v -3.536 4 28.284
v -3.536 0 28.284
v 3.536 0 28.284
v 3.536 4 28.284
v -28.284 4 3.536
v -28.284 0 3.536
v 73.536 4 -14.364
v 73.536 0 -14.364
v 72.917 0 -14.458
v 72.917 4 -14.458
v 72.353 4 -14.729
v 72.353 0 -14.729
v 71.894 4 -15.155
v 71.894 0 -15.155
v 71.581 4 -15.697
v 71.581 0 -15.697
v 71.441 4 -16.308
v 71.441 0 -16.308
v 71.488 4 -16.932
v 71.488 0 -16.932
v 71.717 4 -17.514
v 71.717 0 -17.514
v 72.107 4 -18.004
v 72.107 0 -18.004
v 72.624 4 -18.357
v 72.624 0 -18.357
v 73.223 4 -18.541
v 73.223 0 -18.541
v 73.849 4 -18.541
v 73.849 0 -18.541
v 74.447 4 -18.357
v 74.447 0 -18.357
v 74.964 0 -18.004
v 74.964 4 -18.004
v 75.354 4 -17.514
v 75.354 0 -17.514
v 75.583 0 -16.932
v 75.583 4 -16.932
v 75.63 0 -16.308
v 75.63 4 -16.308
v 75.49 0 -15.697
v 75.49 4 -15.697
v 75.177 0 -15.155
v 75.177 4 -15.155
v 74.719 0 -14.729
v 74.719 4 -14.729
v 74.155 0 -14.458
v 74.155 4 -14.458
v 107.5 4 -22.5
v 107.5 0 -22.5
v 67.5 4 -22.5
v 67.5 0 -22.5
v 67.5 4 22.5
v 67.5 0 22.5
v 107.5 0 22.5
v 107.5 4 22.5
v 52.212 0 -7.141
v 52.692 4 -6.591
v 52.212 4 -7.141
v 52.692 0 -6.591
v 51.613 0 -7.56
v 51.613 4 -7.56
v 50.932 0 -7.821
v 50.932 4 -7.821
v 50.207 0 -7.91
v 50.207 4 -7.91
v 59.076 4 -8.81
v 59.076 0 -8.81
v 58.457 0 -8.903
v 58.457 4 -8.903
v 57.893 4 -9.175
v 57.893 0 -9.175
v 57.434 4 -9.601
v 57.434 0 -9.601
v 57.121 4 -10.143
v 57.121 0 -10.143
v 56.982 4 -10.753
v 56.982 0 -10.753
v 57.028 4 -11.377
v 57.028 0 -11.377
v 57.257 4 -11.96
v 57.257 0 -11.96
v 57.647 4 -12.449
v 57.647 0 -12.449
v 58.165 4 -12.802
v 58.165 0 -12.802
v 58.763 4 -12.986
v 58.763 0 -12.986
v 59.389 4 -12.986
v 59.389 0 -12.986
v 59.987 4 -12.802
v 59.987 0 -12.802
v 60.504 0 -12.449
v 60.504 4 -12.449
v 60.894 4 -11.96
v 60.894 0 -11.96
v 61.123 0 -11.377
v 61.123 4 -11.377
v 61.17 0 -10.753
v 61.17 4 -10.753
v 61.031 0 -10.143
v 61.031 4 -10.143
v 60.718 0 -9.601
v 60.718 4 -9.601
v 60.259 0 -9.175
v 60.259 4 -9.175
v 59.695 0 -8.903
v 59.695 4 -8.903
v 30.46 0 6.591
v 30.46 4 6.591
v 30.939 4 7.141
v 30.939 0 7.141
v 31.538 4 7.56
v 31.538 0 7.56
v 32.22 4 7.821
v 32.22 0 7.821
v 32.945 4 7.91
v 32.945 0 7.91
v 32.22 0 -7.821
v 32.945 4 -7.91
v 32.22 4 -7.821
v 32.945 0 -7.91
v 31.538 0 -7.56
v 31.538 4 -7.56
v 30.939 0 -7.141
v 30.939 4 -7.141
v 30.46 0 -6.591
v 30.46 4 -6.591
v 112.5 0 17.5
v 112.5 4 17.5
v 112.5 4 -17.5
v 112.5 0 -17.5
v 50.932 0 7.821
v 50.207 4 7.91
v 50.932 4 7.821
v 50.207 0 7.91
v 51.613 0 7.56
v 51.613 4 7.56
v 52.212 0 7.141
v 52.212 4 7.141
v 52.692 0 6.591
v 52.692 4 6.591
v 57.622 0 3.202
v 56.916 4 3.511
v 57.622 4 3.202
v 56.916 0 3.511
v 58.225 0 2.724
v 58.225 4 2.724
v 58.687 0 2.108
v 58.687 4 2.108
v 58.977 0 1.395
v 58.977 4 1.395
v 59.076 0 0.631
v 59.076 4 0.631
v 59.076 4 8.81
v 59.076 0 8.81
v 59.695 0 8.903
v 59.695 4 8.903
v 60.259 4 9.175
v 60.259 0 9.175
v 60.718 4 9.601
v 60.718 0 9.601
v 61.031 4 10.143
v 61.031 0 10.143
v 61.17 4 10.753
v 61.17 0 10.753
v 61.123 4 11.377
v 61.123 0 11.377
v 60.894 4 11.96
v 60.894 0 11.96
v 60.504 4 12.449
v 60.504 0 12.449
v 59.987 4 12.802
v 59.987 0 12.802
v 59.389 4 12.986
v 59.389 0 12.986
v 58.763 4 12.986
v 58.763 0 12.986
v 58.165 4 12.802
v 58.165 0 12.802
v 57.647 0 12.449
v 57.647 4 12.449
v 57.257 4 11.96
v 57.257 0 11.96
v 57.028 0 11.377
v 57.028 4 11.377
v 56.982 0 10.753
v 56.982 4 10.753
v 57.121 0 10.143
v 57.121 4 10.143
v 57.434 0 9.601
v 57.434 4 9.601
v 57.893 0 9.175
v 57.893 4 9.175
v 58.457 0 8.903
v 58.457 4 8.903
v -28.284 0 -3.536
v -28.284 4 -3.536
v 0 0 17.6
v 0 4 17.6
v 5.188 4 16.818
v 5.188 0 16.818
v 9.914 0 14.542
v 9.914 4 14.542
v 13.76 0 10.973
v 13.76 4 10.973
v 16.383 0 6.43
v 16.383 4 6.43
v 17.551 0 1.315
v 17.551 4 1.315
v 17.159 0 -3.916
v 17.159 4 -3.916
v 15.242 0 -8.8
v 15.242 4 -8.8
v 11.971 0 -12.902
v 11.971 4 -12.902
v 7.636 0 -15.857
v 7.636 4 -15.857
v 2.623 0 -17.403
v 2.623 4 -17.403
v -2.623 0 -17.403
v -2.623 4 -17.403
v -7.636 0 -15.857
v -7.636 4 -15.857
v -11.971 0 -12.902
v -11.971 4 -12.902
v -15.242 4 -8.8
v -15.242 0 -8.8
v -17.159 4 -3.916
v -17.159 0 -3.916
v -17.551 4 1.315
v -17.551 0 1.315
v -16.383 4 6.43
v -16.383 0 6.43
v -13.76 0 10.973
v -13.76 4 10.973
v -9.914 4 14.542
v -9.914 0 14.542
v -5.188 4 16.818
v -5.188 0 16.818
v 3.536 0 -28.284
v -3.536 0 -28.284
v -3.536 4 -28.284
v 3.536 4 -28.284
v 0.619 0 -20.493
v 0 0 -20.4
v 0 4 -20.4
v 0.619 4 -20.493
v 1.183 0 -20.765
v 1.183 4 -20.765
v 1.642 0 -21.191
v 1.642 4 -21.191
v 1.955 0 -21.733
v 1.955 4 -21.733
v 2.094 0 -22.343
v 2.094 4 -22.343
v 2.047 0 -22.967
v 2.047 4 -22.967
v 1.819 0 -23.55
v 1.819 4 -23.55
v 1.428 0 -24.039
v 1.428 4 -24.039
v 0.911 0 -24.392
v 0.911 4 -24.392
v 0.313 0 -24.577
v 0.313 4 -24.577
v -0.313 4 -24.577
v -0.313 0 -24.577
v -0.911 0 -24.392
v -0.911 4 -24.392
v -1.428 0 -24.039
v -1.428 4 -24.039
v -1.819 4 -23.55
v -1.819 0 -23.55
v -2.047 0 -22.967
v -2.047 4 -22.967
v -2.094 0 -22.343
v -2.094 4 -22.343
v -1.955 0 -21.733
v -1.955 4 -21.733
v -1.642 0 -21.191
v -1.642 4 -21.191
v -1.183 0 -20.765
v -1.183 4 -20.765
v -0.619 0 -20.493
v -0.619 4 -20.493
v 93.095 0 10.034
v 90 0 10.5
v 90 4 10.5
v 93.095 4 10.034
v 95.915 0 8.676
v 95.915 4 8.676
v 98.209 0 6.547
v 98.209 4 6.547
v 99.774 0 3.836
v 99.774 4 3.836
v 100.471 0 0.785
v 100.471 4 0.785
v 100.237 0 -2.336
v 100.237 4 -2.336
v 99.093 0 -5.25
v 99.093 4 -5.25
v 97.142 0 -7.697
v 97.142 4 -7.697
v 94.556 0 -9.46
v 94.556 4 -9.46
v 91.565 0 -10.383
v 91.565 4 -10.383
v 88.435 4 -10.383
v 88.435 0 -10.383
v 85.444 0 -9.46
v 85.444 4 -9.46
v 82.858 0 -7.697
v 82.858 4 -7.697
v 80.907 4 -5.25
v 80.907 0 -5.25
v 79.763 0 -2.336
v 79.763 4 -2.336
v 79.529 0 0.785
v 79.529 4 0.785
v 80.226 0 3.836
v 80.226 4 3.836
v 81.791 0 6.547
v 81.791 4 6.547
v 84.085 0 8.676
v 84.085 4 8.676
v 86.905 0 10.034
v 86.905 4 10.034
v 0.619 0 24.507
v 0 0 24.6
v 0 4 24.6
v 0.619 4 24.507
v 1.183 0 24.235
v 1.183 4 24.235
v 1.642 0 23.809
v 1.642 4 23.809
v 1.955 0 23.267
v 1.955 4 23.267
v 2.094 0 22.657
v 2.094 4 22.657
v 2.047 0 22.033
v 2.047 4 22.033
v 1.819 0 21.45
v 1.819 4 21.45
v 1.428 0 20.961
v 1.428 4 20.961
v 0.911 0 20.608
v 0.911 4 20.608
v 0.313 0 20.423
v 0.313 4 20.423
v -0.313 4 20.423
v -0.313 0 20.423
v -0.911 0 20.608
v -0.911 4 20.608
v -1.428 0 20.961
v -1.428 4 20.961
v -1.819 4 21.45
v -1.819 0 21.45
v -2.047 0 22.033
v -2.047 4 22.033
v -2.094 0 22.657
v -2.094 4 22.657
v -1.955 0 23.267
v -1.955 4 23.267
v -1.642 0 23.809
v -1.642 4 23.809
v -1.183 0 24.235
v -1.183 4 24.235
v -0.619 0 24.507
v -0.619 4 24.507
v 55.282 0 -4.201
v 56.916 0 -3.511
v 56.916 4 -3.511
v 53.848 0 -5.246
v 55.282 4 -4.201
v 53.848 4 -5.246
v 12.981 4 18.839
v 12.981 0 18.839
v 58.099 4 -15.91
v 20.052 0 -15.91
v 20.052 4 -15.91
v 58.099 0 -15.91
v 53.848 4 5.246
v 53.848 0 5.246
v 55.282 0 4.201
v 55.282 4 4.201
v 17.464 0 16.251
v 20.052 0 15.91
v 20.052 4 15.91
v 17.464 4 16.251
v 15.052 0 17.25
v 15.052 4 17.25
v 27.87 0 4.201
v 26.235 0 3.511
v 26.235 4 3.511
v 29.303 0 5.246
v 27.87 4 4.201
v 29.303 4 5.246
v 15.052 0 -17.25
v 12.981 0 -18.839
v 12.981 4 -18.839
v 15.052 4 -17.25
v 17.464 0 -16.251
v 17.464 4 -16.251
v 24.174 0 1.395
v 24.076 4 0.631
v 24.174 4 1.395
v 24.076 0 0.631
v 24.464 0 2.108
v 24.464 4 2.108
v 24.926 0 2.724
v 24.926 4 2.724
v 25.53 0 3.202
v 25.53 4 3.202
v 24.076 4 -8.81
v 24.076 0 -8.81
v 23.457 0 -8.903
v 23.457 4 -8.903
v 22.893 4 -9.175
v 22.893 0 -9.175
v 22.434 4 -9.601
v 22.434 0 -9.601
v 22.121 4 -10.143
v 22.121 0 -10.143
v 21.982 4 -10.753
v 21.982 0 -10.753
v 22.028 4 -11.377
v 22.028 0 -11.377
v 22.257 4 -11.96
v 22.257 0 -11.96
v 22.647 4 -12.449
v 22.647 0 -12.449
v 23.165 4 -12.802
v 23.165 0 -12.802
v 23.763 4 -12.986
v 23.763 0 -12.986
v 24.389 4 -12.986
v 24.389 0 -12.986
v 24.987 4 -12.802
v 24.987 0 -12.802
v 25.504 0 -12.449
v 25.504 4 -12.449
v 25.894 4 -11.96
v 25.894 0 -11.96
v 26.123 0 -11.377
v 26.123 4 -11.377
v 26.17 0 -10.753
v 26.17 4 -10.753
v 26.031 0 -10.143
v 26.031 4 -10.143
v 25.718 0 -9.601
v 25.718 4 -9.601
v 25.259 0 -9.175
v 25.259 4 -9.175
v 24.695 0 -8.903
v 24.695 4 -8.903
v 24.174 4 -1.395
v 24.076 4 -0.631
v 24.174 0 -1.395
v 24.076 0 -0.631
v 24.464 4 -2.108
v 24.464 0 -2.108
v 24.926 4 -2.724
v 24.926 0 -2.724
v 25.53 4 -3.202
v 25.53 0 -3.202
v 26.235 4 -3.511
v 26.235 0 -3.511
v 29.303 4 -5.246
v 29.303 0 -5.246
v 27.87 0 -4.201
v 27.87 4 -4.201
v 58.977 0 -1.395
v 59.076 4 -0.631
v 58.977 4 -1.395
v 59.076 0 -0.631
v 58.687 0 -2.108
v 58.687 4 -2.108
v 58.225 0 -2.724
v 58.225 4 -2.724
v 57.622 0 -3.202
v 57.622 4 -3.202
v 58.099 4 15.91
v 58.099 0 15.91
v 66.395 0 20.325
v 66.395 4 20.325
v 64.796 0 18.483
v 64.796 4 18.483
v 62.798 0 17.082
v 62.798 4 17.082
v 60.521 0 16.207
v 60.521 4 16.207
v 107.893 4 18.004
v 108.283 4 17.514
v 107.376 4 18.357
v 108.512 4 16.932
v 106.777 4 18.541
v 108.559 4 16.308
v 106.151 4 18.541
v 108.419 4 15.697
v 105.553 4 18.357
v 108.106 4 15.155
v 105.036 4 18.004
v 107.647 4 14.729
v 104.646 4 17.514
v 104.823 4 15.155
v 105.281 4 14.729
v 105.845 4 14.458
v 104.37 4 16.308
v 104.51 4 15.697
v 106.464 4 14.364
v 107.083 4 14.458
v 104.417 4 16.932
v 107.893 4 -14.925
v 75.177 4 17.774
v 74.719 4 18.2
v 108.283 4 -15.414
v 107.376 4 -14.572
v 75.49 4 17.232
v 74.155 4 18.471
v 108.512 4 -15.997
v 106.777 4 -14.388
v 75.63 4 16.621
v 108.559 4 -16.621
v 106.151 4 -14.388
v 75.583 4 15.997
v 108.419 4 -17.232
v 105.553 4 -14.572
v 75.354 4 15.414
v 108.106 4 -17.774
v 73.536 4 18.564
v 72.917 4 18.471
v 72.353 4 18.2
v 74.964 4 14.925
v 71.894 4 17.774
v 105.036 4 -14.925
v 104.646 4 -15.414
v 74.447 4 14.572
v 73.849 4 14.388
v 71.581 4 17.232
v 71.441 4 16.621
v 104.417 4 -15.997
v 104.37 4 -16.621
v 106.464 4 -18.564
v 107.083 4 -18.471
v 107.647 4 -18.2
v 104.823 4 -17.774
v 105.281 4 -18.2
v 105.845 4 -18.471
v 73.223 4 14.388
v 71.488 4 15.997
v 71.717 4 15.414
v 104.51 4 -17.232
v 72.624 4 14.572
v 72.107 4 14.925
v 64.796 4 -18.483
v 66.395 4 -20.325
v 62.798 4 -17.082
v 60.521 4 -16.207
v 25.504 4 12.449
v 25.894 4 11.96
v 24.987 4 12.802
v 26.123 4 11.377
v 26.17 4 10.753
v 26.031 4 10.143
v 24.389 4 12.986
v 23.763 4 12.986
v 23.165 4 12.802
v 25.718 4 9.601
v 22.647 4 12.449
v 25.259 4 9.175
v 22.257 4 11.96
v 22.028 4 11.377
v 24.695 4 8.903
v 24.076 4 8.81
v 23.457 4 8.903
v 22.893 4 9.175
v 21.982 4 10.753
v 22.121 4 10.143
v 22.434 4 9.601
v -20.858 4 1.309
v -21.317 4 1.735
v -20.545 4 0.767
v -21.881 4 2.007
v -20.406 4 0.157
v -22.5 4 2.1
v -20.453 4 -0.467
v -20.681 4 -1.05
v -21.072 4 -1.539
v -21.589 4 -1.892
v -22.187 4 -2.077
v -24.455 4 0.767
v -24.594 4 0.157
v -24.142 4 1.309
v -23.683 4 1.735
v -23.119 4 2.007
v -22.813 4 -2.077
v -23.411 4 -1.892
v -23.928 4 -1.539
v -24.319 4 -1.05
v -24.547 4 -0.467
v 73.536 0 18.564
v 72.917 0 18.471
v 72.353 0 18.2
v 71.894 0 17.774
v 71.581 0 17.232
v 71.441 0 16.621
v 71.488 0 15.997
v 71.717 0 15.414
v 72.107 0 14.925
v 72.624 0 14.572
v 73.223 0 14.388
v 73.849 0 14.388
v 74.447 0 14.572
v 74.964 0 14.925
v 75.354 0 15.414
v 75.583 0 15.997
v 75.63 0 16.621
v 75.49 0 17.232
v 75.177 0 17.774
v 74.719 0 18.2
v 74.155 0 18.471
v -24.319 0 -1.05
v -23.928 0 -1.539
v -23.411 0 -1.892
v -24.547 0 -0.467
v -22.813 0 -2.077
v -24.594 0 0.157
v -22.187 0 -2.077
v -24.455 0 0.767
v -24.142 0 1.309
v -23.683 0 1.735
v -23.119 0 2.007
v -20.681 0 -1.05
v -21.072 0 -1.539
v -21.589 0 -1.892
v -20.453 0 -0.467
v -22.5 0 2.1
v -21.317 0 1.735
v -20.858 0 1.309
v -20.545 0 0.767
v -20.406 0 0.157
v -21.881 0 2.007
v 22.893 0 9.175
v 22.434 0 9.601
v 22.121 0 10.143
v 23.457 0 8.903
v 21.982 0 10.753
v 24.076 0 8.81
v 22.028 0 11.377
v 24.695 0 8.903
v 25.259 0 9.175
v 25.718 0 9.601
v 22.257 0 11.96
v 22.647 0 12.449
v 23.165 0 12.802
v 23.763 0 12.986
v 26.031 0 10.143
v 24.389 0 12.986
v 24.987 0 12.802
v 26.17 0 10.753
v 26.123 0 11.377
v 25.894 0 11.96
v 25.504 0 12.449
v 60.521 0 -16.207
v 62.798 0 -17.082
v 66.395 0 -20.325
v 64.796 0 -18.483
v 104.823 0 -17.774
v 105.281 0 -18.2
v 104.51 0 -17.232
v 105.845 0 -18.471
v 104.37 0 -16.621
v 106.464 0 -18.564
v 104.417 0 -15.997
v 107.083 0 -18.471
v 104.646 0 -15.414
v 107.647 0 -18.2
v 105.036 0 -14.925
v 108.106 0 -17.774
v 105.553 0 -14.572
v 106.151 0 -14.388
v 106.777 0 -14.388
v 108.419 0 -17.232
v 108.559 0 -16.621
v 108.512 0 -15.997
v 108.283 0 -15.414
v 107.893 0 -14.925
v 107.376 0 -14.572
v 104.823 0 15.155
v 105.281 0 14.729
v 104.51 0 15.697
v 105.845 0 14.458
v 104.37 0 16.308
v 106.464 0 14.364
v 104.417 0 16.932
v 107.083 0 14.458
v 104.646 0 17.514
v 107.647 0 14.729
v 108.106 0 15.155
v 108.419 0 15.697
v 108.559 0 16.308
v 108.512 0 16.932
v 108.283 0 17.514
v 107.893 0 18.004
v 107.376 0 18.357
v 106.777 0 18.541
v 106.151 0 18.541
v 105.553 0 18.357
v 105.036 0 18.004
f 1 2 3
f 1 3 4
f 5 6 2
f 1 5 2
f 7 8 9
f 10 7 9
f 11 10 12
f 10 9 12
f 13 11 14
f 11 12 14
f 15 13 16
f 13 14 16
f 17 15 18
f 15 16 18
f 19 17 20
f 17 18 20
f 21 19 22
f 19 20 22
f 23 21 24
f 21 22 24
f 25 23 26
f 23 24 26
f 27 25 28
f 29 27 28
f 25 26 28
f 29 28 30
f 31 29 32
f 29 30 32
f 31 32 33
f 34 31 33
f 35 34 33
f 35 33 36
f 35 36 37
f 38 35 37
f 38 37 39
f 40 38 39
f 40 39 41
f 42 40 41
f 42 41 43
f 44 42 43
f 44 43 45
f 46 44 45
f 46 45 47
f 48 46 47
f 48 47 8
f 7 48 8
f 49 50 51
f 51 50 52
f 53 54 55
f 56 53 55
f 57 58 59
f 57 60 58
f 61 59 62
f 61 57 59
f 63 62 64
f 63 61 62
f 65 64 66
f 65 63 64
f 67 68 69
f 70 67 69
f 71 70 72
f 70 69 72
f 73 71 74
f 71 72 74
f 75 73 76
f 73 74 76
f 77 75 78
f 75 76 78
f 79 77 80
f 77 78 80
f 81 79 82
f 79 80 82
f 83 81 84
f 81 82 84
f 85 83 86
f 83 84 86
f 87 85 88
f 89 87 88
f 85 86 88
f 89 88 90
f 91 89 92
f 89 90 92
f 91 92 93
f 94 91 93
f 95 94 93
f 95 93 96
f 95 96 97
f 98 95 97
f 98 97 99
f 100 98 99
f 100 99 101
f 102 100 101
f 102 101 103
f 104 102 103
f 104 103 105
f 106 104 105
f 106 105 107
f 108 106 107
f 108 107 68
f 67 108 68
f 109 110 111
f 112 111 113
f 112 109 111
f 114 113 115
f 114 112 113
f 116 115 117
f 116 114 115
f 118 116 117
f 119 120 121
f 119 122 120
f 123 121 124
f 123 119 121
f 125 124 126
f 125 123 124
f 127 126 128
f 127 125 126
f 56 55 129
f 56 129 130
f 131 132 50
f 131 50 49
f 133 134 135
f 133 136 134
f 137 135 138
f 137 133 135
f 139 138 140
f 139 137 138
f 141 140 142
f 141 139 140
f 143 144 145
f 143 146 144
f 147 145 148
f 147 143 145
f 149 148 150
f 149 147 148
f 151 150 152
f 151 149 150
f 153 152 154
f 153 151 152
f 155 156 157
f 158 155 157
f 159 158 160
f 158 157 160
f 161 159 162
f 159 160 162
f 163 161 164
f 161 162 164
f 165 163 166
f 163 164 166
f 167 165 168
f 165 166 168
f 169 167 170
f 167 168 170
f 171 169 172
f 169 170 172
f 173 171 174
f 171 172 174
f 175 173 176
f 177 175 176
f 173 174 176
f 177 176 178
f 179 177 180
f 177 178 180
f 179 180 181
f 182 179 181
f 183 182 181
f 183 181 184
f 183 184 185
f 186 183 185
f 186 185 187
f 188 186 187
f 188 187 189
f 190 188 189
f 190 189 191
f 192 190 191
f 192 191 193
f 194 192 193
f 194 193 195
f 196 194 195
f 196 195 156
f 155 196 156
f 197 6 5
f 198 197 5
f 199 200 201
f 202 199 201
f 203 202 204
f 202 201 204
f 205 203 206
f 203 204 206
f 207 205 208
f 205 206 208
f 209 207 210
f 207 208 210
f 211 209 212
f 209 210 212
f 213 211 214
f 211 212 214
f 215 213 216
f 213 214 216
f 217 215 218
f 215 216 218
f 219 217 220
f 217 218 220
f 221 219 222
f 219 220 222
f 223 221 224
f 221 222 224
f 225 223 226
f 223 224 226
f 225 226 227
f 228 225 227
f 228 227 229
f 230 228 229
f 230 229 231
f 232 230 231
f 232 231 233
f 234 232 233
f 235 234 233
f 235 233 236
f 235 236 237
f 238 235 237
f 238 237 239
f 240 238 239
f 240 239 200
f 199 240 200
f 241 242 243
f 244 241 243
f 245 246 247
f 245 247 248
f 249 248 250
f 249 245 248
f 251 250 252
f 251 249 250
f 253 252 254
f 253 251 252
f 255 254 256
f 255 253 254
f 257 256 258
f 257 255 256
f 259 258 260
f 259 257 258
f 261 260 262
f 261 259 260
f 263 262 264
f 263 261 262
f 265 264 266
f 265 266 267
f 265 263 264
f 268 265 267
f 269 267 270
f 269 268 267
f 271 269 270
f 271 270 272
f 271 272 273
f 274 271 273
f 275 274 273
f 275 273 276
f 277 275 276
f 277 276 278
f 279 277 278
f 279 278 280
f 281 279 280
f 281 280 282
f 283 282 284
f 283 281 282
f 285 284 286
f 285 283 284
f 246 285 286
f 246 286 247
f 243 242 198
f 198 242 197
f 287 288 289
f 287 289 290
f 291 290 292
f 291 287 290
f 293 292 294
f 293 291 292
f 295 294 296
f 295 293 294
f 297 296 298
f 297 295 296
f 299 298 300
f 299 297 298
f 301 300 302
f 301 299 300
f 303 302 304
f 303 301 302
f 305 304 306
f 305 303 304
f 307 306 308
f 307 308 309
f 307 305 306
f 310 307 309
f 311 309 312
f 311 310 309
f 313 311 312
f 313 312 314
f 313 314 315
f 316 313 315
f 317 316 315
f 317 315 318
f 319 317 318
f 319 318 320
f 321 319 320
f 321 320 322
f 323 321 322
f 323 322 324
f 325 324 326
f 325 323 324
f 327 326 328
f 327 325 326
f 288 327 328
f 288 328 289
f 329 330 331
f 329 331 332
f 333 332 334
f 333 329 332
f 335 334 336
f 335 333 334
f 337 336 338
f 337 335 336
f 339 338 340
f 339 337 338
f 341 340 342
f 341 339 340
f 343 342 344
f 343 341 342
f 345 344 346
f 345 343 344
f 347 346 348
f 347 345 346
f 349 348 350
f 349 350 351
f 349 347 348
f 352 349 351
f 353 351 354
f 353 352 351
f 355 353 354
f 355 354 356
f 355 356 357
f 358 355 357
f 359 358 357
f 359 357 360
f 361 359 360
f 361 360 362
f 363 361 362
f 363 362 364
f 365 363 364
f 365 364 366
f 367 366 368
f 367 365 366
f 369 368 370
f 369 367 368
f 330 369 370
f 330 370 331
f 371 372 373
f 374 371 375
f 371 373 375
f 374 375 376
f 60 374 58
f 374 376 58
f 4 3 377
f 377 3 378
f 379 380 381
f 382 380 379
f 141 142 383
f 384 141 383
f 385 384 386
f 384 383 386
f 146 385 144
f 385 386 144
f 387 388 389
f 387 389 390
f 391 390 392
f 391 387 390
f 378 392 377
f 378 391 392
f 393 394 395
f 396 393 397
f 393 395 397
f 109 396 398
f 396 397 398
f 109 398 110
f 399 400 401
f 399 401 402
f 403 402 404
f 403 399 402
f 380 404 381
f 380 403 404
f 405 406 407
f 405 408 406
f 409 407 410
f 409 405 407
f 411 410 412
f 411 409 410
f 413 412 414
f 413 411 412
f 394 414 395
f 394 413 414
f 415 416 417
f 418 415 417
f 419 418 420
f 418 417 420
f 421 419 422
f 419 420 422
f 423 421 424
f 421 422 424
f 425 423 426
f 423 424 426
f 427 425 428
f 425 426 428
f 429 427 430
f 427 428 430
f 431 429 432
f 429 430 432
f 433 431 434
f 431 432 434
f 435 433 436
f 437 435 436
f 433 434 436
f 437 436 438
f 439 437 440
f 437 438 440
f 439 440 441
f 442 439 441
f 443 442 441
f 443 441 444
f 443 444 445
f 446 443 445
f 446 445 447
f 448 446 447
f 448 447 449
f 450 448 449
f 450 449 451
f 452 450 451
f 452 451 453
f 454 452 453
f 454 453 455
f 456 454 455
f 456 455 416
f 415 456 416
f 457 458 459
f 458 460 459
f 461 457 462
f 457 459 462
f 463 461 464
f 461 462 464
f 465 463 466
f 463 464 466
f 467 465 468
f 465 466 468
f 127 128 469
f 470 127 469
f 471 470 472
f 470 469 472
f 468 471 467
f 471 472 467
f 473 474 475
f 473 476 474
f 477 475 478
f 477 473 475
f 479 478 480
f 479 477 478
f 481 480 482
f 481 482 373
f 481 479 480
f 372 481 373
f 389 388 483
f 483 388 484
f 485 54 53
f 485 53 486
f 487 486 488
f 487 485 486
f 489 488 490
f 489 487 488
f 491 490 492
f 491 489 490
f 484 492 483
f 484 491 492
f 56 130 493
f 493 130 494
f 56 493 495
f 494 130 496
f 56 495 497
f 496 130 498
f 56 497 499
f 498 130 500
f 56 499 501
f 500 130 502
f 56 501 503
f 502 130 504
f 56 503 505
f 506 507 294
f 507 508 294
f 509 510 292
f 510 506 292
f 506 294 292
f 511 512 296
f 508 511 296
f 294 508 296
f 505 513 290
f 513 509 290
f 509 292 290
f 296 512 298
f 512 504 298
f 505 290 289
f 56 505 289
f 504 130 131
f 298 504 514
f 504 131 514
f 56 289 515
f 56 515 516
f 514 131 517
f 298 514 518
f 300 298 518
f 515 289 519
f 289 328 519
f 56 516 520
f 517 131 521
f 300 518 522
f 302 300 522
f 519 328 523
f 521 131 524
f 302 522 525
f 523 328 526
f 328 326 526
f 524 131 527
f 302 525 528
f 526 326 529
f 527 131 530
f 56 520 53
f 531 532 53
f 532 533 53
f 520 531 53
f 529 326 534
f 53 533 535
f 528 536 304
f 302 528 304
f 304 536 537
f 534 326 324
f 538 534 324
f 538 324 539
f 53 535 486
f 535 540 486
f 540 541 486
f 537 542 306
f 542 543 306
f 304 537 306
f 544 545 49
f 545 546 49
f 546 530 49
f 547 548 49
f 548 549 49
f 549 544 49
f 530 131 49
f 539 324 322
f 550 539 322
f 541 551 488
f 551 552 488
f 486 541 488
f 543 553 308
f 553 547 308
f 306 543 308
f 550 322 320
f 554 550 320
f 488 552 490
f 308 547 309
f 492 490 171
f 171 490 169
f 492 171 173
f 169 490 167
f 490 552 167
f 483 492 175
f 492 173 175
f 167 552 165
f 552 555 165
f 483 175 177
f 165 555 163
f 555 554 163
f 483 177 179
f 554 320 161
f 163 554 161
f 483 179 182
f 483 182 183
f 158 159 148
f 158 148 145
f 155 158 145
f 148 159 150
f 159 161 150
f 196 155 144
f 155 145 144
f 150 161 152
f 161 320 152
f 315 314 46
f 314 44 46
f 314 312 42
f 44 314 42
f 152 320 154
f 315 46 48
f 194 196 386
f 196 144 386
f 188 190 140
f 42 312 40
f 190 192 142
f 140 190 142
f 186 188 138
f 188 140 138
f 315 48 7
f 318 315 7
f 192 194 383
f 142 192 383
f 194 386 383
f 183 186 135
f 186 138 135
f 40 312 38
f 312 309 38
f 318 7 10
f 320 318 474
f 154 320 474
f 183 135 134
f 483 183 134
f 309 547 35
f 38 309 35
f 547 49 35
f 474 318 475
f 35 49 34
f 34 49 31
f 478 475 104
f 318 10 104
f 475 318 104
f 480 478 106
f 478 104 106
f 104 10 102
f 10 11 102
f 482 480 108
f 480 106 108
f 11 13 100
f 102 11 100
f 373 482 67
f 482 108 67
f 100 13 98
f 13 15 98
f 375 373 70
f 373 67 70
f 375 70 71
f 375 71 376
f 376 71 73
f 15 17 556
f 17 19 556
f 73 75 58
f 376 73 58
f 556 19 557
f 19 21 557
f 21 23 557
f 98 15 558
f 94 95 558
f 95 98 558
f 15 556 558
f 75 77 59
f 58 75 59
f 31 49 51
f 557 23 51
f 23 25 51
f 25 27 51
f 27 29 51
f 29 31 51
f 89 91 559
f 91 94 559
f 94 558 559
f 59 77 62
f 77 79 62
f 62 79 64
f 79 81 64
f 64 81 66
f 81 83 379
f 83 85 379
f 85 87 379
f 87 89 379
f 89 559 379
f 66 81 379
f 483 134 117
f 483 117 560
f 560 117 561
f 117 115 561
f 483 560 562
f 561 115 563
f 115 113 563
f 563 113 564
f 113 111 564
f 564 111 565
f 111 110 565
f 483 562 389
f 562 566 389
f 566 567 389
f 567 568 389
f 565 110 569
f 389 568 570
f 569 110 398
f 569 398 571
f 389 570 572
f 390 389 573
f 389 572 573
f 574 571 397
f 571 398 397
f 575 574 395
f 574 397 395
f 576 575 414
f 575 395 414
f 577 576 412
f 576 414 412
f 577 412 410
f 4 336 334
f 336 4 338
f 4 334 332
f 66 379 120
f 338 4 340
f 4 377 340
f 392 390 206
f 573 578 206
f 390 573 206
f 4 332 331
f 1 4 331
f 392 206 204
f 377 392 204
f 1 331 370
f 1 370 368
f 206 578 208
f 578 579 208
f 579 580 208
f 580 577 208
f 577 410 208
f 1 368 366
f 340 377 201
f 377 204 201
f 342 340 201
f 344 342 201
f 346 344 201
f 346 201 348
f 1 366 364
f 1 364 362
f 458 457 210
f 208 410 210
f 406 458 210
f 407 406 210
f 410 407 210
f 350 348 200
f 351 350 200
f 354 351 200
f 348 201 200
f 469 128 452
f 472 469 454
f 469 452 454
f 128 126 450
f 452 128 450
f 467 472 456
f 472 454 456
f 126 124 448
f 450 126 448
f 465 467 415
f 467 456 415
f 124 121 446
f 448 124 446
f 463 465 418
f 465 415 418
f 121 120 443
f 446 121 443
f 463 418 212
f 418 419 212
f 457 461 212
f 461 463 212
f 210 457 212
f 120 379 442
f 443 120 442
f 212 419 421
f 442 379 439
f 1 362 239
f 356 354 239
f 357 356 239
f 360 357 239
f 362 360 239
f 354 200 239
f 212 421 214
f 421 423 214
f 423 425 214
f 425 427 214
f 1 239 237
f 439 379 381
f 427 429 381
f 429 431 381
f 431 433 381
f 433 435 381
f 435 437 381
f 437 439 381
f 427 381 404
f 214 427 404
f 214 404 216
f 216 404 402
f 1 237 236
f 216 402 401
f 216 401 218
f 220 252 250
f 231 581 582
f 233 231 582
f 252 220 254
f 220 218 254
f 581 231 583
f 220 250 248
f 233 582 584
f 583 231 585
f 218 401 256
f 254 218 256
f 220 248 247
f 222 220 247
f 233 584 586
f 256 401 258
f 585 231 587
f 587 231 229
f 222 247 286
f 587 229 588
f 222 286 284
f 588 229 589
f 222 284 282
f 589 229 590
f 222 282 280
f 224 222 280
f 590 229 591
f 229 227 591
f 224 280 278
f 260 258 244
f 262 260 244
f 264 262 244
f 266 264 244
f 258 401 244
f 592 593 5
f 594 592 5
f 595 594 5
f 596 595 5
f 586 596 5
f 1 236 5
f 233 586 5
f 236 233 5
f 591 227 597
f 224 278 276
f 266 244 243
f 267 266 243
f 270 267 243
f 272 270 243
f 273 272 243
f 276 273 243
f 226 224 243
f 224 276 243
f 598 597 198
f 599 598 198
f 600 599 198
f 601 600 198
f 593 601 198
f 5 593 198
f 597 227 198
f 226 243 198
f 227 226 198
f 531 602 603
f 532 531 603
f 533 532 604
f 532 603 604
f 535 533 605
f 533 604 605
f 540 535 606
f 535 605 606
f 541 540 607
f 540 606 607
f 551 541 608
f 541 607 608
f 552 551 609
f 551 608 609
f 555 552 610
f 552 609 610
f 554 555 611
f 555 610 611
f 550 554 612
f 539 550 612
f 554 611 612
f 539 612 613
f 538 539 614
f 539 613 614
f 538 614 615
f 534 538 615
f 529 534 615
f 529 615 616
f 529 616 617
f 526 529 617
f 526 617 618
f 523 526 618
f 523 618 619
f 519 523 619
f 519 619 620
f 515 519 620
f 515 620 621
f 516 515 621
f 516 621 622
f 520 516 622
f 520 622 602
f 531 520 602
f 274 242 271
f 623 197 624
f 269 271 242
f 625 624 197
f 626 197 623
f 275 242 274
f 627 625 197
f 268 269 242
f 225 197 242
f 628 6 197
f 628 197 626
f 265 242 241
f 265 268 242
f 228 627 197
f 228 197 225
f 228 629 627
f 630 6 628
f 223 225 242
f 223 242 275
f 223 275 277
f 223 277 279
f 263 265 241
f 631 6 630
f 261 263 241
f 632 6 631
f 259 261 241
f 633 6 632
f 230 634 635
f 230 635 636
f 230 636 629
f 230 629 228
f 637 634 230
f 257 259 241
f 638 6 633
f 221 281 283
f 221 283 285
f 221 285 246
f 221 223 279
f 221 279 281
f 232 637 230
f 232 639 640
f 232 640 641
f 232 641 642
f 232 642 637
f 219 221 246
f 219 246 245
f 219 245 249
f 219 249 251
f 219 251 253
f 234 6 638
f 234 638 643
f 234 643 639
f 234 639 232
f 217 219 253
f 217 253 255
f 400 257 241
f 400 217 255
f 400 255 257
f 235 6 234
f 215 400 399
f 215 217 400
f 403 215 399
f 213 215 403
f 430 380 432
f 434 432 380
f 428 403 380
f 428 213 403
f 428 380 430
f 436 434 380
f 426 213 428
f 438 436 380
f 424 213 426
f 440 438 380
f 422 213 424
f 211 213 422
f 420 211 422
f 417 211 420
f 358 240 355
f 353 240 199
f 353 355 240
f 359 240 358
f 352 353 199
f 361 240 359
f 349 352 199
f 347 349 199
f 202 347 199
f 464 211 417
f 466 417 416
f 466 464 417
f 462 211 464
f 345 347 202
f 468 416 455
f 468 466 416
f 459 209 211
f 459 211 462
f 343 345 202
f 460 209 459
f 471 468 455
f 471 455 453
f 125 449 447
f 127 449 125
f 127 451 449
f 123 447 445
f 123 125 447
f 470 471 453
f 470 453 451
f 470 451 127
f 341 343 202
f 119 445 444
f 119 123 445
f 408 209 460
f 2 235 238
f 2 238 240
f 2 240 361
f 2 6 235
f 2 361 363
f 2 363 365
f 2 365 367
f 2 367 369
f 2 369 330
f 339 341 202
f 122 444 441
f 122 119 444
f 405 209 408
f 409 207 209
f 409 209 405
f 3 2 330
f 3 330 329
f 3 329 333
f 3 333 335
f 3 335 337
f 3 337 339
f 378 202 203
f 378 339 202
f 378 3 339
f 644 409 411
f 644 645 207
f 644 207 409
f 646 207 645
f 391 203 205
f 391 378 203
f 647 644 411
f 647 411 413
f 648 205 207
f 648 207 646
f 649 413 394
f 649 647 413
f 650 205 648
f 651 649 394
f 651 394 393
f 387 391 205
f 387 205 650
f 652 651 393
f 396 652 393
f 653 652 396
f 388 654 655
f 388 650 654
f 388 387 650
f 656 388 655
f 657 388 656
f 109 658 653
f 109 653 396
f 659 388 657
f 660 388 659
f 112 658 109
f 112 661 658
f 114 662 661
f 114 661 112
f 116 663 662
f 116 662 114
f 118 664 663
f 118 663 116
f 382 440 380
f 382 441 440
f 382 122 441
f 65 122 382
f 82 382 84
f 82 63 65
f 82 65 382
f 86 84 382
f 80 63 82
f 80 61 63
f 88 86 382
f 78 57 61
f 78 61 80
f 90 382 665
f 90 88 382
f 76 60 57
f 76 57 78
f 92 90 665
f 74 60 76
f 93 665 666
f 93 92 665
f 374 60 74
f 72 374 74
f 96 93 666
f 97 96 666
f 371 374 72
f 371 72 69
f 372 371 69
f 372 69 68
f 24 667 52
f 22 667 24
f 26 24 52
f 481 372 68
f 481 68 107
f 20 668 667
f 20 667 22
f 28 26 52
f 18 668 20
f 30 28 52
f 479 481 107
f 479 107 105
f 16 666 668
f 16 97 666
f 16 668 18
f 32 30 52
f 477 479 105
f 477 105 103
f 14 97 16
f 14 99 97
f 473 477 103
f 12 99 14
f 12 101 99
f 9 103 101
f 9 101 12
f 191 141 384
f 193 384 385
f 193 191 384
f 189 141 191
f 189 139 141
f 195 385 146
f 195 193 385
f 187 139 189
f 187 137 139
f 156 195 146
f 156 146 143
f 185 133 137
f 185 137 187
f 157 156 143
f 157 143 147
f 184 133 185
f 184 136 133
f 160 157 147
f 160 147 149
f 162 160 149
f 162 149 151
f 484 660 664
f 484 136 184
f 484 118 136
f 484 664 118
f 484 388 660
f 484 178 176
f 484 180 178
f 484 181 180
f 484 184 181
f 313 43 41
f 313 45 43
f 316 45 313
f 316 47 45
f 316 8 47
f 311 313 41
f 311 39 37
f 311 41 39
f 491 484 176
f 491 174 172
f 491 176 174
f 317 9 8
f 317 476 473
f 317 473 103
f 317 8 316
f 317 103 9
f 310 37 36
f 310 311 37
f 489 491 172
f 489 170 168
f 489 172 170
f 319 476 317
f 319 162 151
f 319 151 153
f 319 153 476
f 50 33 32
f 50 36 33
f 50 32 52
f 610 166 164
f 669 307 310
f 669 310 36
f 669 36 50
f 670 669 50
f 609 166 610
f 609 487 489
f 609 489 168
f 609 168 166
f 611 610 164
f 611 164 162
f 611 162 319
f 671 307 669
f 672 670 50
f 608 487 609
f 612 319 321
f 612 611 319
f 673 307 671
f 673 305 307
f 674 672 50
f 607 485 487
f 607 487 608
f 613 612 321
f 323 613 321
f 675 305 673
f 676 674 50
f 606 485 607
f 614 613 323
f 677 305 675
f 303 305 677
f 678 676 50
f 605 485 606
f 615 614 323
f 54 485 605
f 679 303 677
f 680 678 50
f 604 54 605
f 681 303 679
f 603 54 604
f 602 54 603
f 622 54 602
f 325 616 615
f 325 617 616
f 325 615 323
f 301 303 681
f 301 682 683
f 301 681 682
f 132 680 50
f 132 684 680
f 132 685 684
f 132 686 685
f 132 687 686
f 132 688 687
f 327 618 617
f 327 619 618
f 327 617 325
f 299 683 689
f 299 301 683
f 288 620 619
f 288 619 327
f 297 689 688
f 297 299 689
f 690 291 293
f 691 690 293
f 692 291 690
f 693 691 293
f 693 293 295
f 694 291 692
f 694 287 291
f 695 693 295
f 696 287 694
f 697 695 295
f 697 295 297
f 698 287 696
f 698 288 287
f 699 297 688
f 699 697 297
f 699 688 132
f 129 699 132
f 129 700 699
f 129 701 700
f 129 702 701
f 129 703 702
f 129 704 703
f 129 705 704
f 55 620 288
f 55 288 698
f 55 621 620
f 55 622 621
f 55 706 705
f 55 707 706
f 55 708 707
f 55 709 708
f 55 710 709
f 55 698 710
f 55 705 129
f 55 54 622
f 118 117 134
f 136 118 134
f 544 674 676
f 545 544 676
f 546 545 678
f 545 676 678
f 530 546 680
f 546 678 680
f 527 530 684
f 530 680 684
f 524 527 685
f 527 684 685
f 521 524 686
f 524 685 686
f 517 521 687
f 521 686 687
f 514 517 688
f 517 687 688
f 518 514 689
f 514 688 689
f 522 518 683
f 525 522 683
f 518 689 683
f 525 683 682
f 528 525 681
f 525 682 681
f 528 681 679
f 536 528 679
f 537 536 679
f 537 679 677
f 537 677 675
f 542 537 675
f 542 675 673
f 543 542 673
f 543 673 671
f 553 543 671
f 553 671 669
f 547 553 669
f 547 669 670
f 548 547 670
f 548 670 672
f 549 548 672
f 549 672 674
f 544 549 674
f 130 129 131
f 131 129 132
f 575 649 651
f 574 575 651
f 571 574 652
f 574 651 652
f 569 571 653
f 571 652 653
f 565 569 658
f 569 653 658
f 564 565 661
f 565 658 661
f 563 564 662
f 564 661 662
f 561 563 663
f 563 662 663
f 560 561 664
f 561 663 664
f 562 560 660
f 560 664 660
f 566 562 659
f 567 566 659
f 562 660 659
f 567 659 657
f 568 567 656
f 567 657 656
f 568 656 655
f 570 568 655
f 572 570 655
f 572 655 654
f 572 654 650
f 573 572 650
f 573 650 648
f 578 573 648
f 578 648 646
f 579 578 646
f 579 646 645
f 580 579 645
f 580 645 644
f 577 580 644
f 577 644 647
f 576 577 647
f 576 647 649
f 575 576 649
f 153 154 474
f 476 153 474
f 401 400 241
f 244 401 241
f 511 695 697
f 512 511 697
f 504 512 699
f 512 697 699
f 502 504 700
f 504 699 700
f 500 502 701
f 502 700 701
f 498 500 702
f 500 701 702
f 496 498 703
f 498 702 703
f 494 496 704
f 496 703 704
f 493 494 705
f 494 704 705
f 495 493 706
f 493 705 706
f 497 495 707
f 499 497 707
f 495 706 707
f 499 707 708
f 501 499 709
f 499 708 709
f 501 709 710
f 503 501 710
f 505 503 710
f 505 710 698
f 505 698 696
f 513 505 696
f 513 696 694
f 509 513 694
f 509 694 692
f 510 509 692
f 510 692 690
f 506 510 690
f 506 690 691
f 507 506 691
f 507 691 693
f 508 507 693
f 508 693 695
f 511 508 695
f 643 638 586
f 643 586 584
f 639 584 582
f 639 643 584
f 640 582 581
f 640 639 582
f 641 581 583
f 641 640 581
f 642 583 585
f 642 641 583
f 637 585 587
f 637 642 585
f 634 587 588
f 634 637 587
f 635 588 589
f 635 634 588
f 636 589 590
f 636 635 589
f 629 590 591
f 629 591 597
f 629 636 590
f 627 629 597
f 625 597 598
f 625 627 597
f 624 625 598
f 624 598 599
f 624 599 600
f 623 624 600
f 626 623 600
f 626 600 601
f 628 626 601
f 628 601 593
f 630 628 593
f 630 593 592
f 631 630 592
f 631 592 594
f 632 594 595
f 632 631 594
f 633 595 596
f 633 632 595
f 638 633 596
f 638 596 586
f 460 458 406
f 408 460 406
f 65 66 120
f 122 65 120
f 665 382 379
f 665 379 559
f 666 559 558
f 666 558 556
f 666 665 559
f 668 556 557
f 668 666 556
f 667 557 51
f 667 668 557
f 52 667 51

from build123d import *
from OCP.BRepFilletAPI import BRepFilletAPI_MakeChamfer

# Parameters (mm, degrees)
SKETCH_1_R          = 2.1
SKETCH_1_R_2        = 10.5
SKETCH_1_R_3        = 10
EXTRUDE_1_DEPTH     = 4
CHAMFER_1_SIZE      = 5
FILLET_1_R          = 10
SKETCH_2_R          = 2.1
CUT_EXTRUDE_1_DEPTH = 10
SKETCH_3_R          = 1.6
EXTRUDE_2_DEPTH     = 3
SKETCH_4_R          = 17.6
CUT_EXTRUDE_2_DEPTH = 10
CUT_EXTRUDE_3_DEPTH = 31.8
FILLET_6_R          = 3
FILLET_7_R          = 4
EXTRUDE_START       = -3
EXTRUDE_3_DEPTH     = 3
FILLET_8_R          = 4
CHAMFER_4_SIZE      = 15
CHAMFER_4_SIZE2     = 22.404226252
CUT_EXTRUDE_4_DEPTH = 3
FILLET_11_R         = 5
EXTRUDE_4_DEPTH     = 3
FILLET_12_R         = 5
CHAMFER_5_SIZE      = 1.5
CHAMFER_5_SIZE2     = 1.429177646
CHAMFER_5_SIZE2_2   = 1.610271544
CUT_EXTRUDE_START   = -10
CUT_EXTRUDE_5_DEPTH = 10


with BuildPart() as part:
    # 草图1 → 凸台-拉伸1 (new body)
    with BuildSketch(Plane(origin=(0, 0, 0), x_dir=(1, 0, 0), z_dir=(0, 1, 0))):
        Polygon((0, 31.819805153), (-31.819805153, 0), (0, -31.819805153), (15.909902577, -15.909902577), (67.5, -15.909902577), (67.5, -22.5), (112.5, -22.5), (112.5, 22.5), (67.5, 22.5), (67.5, 15.909902577), (15.909902577, 15.909902577), align=None)
        with Locations(Location((0, 14, 0), (0, 0, 270))):
            Circle(SKETCH_1_R, mode=Mode.SUBTRACT)
        with Locations(Location((14, 0, 0), (0, 0, 270))):
            Circle(SKETCH_1_R, mode=Mode.SUBTRACT)
        with Locations(Location((0, -14, 0), (0, 0, 270))):
            Circle(SKETCH_1_R, mode=Mode.SUBTRACT)
        with Locations(Location((-14, 0, 0), (0, 0, 270))):
            Circle(SKETCH_1_R, mode=Mode.SUBTRACT)
        with Locations(Location((90, 0, 0), (0, 0, 270))):
            Circle(SKETCH_1_R_2, mode=Mode.SUBTRACT)
        with Locations(Location((0, 22.5, 0), (0, 0, 270))):
            Circle(SKETCH_1_R, mode=Mode.SUBTRACT)
        with Locations(Location((0, -22.5, 0), (0, 0, 270))):
            Circle(SKETCH_1_R, mode=Mode.SUBTRACT)
        with Locations(Location((0, 0, 0), (0, 0, 270))):
            Circle(SKETCH_1_R_3, mode=Mode.SUBTRACT)
        with Locations(Location((-22.5, 0, 0), (0, 0, 270))):
            Circle(SKETCH_1_R, mode=Mode.SUBTRACT)
    extrude(amount=EXTRUDE_1_DEPTH)

    # 倒角1
    chamfer_1_edges = [part.edges().sort_by_distance(p)[0] for p in [
        (112.5, 2, -22.5),
        (112.5, 2, 22.5),
        (0, 2, 31.819805153),
        (-31.819805153, 2, 0),
        (0, 2, -31.819805153),
    ]]
    chamfer(chamfer_1_edges, length=CHAMFER_1_SIZE)

    # 圆角1
    # the kernel refuses this fillet: 10 mm, written as the material it adds along each edge
    with BuildSketch(Plane(origin=(15.909902577, 0, -15.909902577), x_dir=(-0.707106781186552, 0, -0.707106781186543), z_dir=(0, 1, 0))) as fillet_1_piece_1:
        with BuildLine():
            CenterArc((FILLET_1_R * 0.414213562373, -FILLET_1_R), FILLET_1_R, 90, 45)
            Line((-FILLET_1_R * 0.292893218813, -FILLET_1_R * 0.292893218813), (-FILLET_1_R * 0.307035354437, -FILLET_1_R * 0.27875108319))
            Line((-FILLET_1_R * 0.307035354437, -FILLET_1_R * 0.27875108319), (-FILLET_1_R * 0.00828427124746, FILLET_1_R * 0.02))
            Line((-FILLET_1_R * 0.00828427124746, FILLET_1_R * 0.02), (FILLET_1_R * 0.414213562373, FILLET_1_R * 0.02))
            Line((FILLET_1_R * 0.414213562373, FILLET_1_R * 0.02), (FILLET_1_R * 0.414213562373, 0))
        make_face()
    extrude(amount=4)
    with BuildSketch(Plane(origin=(15.909902577, 0, 15.909902577), x_dir=(-0.7071067811865422, 0, 0.707106781186553), z_dir=(0, 1, 0))) as fillet_1_piece_2:
        with BuildLine():
            CenterArc((FILLET_1_R * 0.414213562373, FILLET_1_R), FILLET_1_R, 225, 45)
            Line((-FILLET_1_R * 0.292893218813, FILLET_1_R * 0.292893218813), (-FILLET_1_R * 0.307035354437, FILLET_1_R * 0.27875108319))
            Line((-FILLET_1_R * 0.307035354437, FILLET_1_R * 0.27875108319), (-FILLET_1_R * 0.00828427124746, -FILLET_1_R * 0.02))
            Line((-FILLET_1_R * 0.00828427124746, -FILLET_1_R * 0.02), (FILLET_1_R * 0.414213562373, -FILLET_1_R * 0.02))
            Line((FILLET_1_R * 0.414213562373, -FILLET_1_R * 0.02), (FILLET_1_R * 0.414213562373, 0))
        make_face()
    extrude(amount=4)
    with BuildSketch(Plane(origin=(67.5, 0, 15.909902577), x_dir=(-1, 0, 0), z_dir=(0, 1, 0))) as fillet_1_piece_3:
        with BuildLine():
            CenterArc((9.400668296, 10), FILLET_1_R, 199.937217397, 70.062782603)
            Line((0, 6.590097423), (-0.188013366, 6.521899372))
            ThreePointArc((-0.188013366, 6.521899372), (-0.2, 3.295048712), (-0.2, 0))
            Line((-0.2, 0), (0, -0.2))
            Line((0, -0.2), (9.400668296, -0.2))
            Line((9.400668296, -0.2), (9.400668296, 0))
        make_face()
    extrude(amount=4)
    with BuildSketch(Plane(origin=(67.5, 0, -15.909902577), x_dir=(-1, 0, 0), z_dir=(0, 1, 0))) as fillet_1_piece_4:
        with BuildLine():
            CenterArc((9.400668296, -10), FILLET_1_R, 90, 70.062782603)
            Line((0, -6.590097423), (-0.188013366, -6.521899372))
            ThreePointArc((-0.188013366, -6.521899372), (-0.2, -3.295048712), (-0.2, 0))
            Line((-0.2, 0), (0, 0.2))
            Line((0, 0.2), (9.400668296, 0.2))
            Line((9.400668296, 0.2), (9.400668296, 0))
        make_face()
    extrude(amount=4)

    # 草图2 → 切除-拉伸1 (cut)
    with BuildSketch(Plane.XZ):
        with Locations(Location((106.464466094, 16.464466094, 0), (0, 0, 270))):
            Circle(SKETCH_2_R)
        with Locations(Location((106.464466094, -16.464466094, 0), (0, 0, 270))):
            Circle(SKETCH_2_R)
        with Locations(Location((73.535533906, -16.464466094, 0), (0, 0, 90))):
            Circle(SKETCH_2_R)
        with Locations(Location((73.535533906, 16.464466094, 0), (0, 0, 90))):
            Circle(SKETCH_2_R)
        with Locations(Location((24.075684952, 10.909902577, 0), (0, 0, 270))):
            Circle(SKETCH_2_R)
        with Locations(Location((59.075684952, 10.909902577, 0), (0, 0, 270))):
            Circle(SKETCH_2_R)
        with Locations(Location((59.075684952, -10.909902577, 0), (0, 0, 90))):
            Circle(SKETCH_2_R)
        with Locations(Location((24.075684952, -10.909902577, 0), (0, 0, 90))):
            Circle(SKETCH_2_R)
    extrude(amount=-CUT_EXTRUDE_1_DEPTH, mode=Mode.SUBTRACT)

    # 草图3 → 凸台-拉伸2 (add)
    with BuildSketch(Plane(origin=(0, 4, 0), x_dir=(1, 0, 0), z_dir=(0, 1, 0))):
        Polygon((74.689031721, 83.86671265), (39.075684952, 15.909902577), (49.236670423, 15.909902577), (78, 70.795621063), (98.581853944, 22.5), (107.5, 22.5), (81.347717681, 83.86671265), align=None)
        with Locations(Location((78, 77.942286341, 0), (0, 0, 270))):
            Circle(SKETCH_3_R, mode=Mode.SUBTRACT)
    extrude(amount=-EXTRUDE_2_DEPTH)

    # 草图4 → 切除-拉伸2 (cut)
    with BuildSketch(Plane(origin=(0, 4, 0), x_dir=(1, 0, 0), z_dir=(0, 1, 0))):
        with Locations(Location((0, 0, 0), (0, 0, 270))):
            Circle(SKETCH_4_R)
    extrude(amount=-CUT_EXTRUDE_2_DEPTH, mode=Mode.SUBTRACT)

    # 草图5 → 切除-拉伸3 (cut)
    with BuildSketch(Plane(origin=(0, 4, 0), x_dir=(1, 0, 0), z_dir=(0, 1, 0))):
        with BuildLine():
            Line((24.075684952, 3.202114308), (24.075684952, -3.202114308))
            ThreePointArc((24.075684952, -3.202114308), (28.335182293, -4.485987695), (31.175684952, -7.909902577))
            Line((31.175684952, -7.909902577), (51.975684952, -7.909902577))
            ThreePointArc((51.975684952, -7.909902577), (54.816187611, -4.485987695), (59.075684952, -3.202114308))
            Line((59.075684952, -3.202114308), (59.075684952, 3.202114308))
            ThreePointArc((59.075684952, 3.202114308), (54.816187611, 4.485987695), (51.975684952, 7.909902577))
            Line((51.975684952, 7.909902577), (31.175684952, 7.909902577))
            ThreePointArc((31.175684952, 7.909902577), (28.335182293, 4.485987695), (24.075684952, 3.202114308))
        make_face()
    extrude(amount=-CUT_EXTRUDE_3_DEPTH, mode=Mode.SUBTRACT)

    # 圆角6
    fillet_6_edges = [part.edges().sort_by_distance(p)[0] for p in [
        (24.075684952, 2, -3.202114308),
        (31.175684952, 2, -7.909902577),
        (51.975684952, 2, -7.909902577),
        (59.075684952, 2, -3.202114308),
        (59.075684952, 2, 3.202114308),
        (51.975684952, 2, 7.909902577),
        (31.175684952, 2, 7.909902577),
        (24.075684952, 2, 3.202114308),
    ]]
    fillet(fillet_6_edges, radius=FILLET_6_R)

    # 圆角7
    fillet_7_edges = [part.edges().sort_by_distance(p)[0] for p in [
        (49.236670423, 2.5, -15.909902577),
    ]]
    fillet(fillet_7_edges, radius=FILLET_7_R)

    # 草图6 → 凸台-拉伸3 (add)
    with BuildSketch(Plane(origin=(0, 4, 0), x_dir=(1, 0, 0), z_dir=(0, 1, 0)).offset(EXTRUDE_START)):
        with BuildLine():
            Line((67.5, 22.5), (52.690267267, 22.5))
            Line((52.690267267, 22.5), (52.305934696, 21.766622828))
            ThreePointArc((52.305934696, 21.766622828), (52.426407737, 17.83950177), (55.848898132, 15.909902577))
            Line((55.848898132, 15.909902577), (58.099331704, 15.909902577))
            ThreePointArc((58.099331704, 15.909902577), (63.839583189, 17.721525883), (67.5, 22.5))
        make_face()
    extrude(amount=EXTRUDE_3_DEPTH)

    # 圆角8
    fillet_8_edges = [part.edges().sort_by_distance(p)[0] for p in [
        (98.581853944, 2.5, -22.5),
        (78, 2.5, -70.795621063),
        (52.690267267, 2.5, -22.5),
    ]]
    fillet(fillet_8_edges, radius=FILLET_8_R)

    # 倒角4
    chamfer_4_edges = [part.edges().sort_by_distance(p)[0] for p in [
        (39.075684952, 2.5, -15.909902577),
    ]]
    chamfer_4_side = [part.faces().sort_by_distance(p)[0] for p in [
        (33.368590927, 1.7, -15.909902577),
    ]]
    chamfer(chamfer_4_edges, length=CHAMFER_4_SIZE, length2=CHAMFER_4_SIZE2, reference=chamfer_4_side[0])

    # 草图7 → 切除-拉伸4 (cut)
    with BuildSketch(Plane(origin=(0, 4, 0), x_dir=(1, 0, 0), z_dir=(0, 1, 0))):
        with BuildLine():
            Line((32.197031179, 15.909902577), (56.151580128, 15.909902577))
            Line((56.151580128, 15.909902577), (59.302494975, 17.5))
            ThreePointArc((59.302494975, 17.5), (51.509584112, 21.997718325), (51.505632804, 30.995435494))
            Line((51.505632804, 30.995435494), (32.197031179, 15.909902577))
        make_face()
    extrude(amount=-CUT_EXTRUDE_4_DEPTH, mode=Mode.SUBTRACT)

    # 圆角11
    fillet_11_edges = [part.edges().sort_by_distance(p)[0] for p in [
        (49.475280099, 2.5, -35.754241184),
        (24.075684952, 2.5, -15.909902577),
    ]]
    fillet(fillet_11_edges, radius=FILLET_11_R)

    # 草图8 → 凸台-拉伸4 (add)
    with BuildSketch(Plane(origin=(0, 4, 0), x_dir=(1, 0, 0), z_dir=(0, 1, 0))):
        Polygon((81.347717681, 83.86671265), (83.347717681, 83.86671265), (85.253411001, 74.701946198), align=None)
        Polygon((74.689031721, 83.86671265), (72.689031721, 83.86671265), (69.886157582, 74.701946198), align=None)
    extrude(amount=-EXTRUDE_4_DEPTH)

    # 圆角12
    fillet_12_edges = [part.edges().sort_by_distance(p)[0] for p in [
        (85.253411001, 2.5, -74.701946198),
        (69.886157582, 2.5, -74.701946198),
    ]]
    fillet(fillet_12_edges, radius=FILLET_12_R)

    # 倒角5: one chamfer whose edges measure the first distance from different faces: ONE call of the kernel's chamfer builder (chamfer() names one face for all edges)
    chamfer_5_edges_1 = [part.edges().sort_by_distance(p)[0] for p in [
        (83.347717681, 2.5, -83.86671265),
    ]]
    chamfer_5_side_1 = [part.faces().sort_by_distance(p)[0] for p in [
        (78.018374701, 2.5, -83.86671265),
    ]]
    chamfer_5_edges_2 = [part.edges().sort_by_distance(p)[0] for p in [
        (72.689031721, 2.5, -83.86671265),
    ]]
    chamfer_5_side_2 = [part.faces().sort_by_distance(p)[0] for p in [
        (71.355755289, 2.5, -79.50719934),
    ]]
    chamfer_5 = BRepFilletAPI_MakeChamfer(part.part.solid().wrapped)
    for e in chamfer_5_edges_1:
        chamfer_5.Add(CHAMFER_5_SIZE, CHAMFER_5_SIZE2, e.wrapped, chamfer_5_side_1[0].wrapped)  # the first distance lies on this face
    for e in chamfer_5_edges_2:
        chamfer_5.Add(CHAMFER_5_SIZE, CHAMFER_5_SIZE2_2, e.wrapped, chamfer_5_side_2[0].wrapped)  # the first distance lies on this face
    add(Compound.cast(chamfer_5.Shape()), mode=Mode.REPLACE)

    # 草图9 → 切除-拉伸5 (cut)
    with BuildSketch(Plane(origin=(0, 4, 0), x_dir=(1, 0, 0), z_dir=(0, 1, 0)).offset(CUT_EXTRUDE_START)):
        with BuildLine():
            Line((22.354046886, 15.909902577), (58.099331704, 15.909902577))
            ThreePointArc((58.099331704, 15.909902577), (63.839583189, 17.721525883), (67.5, 22.5))
            Line((67.5, 22.5), (112.713100818, 22.5))
            Line((112.713100818, 22.5), (128.205404221, 15.909902577))
            Line((128.205404221, 15.909902577), (92.949872776, 93.149070556))
            Line((92.949872776, 93.149070556), (54.968117123, 93.149070556))
            Line((54.968117123, 93.149070556), (22.354046886, 15.909902577))
        make_face()
    extrude(amount=CUT_EXTRUDE_5_DEPTH, mode=Mode.SUBTRACT)


solid = part.part
